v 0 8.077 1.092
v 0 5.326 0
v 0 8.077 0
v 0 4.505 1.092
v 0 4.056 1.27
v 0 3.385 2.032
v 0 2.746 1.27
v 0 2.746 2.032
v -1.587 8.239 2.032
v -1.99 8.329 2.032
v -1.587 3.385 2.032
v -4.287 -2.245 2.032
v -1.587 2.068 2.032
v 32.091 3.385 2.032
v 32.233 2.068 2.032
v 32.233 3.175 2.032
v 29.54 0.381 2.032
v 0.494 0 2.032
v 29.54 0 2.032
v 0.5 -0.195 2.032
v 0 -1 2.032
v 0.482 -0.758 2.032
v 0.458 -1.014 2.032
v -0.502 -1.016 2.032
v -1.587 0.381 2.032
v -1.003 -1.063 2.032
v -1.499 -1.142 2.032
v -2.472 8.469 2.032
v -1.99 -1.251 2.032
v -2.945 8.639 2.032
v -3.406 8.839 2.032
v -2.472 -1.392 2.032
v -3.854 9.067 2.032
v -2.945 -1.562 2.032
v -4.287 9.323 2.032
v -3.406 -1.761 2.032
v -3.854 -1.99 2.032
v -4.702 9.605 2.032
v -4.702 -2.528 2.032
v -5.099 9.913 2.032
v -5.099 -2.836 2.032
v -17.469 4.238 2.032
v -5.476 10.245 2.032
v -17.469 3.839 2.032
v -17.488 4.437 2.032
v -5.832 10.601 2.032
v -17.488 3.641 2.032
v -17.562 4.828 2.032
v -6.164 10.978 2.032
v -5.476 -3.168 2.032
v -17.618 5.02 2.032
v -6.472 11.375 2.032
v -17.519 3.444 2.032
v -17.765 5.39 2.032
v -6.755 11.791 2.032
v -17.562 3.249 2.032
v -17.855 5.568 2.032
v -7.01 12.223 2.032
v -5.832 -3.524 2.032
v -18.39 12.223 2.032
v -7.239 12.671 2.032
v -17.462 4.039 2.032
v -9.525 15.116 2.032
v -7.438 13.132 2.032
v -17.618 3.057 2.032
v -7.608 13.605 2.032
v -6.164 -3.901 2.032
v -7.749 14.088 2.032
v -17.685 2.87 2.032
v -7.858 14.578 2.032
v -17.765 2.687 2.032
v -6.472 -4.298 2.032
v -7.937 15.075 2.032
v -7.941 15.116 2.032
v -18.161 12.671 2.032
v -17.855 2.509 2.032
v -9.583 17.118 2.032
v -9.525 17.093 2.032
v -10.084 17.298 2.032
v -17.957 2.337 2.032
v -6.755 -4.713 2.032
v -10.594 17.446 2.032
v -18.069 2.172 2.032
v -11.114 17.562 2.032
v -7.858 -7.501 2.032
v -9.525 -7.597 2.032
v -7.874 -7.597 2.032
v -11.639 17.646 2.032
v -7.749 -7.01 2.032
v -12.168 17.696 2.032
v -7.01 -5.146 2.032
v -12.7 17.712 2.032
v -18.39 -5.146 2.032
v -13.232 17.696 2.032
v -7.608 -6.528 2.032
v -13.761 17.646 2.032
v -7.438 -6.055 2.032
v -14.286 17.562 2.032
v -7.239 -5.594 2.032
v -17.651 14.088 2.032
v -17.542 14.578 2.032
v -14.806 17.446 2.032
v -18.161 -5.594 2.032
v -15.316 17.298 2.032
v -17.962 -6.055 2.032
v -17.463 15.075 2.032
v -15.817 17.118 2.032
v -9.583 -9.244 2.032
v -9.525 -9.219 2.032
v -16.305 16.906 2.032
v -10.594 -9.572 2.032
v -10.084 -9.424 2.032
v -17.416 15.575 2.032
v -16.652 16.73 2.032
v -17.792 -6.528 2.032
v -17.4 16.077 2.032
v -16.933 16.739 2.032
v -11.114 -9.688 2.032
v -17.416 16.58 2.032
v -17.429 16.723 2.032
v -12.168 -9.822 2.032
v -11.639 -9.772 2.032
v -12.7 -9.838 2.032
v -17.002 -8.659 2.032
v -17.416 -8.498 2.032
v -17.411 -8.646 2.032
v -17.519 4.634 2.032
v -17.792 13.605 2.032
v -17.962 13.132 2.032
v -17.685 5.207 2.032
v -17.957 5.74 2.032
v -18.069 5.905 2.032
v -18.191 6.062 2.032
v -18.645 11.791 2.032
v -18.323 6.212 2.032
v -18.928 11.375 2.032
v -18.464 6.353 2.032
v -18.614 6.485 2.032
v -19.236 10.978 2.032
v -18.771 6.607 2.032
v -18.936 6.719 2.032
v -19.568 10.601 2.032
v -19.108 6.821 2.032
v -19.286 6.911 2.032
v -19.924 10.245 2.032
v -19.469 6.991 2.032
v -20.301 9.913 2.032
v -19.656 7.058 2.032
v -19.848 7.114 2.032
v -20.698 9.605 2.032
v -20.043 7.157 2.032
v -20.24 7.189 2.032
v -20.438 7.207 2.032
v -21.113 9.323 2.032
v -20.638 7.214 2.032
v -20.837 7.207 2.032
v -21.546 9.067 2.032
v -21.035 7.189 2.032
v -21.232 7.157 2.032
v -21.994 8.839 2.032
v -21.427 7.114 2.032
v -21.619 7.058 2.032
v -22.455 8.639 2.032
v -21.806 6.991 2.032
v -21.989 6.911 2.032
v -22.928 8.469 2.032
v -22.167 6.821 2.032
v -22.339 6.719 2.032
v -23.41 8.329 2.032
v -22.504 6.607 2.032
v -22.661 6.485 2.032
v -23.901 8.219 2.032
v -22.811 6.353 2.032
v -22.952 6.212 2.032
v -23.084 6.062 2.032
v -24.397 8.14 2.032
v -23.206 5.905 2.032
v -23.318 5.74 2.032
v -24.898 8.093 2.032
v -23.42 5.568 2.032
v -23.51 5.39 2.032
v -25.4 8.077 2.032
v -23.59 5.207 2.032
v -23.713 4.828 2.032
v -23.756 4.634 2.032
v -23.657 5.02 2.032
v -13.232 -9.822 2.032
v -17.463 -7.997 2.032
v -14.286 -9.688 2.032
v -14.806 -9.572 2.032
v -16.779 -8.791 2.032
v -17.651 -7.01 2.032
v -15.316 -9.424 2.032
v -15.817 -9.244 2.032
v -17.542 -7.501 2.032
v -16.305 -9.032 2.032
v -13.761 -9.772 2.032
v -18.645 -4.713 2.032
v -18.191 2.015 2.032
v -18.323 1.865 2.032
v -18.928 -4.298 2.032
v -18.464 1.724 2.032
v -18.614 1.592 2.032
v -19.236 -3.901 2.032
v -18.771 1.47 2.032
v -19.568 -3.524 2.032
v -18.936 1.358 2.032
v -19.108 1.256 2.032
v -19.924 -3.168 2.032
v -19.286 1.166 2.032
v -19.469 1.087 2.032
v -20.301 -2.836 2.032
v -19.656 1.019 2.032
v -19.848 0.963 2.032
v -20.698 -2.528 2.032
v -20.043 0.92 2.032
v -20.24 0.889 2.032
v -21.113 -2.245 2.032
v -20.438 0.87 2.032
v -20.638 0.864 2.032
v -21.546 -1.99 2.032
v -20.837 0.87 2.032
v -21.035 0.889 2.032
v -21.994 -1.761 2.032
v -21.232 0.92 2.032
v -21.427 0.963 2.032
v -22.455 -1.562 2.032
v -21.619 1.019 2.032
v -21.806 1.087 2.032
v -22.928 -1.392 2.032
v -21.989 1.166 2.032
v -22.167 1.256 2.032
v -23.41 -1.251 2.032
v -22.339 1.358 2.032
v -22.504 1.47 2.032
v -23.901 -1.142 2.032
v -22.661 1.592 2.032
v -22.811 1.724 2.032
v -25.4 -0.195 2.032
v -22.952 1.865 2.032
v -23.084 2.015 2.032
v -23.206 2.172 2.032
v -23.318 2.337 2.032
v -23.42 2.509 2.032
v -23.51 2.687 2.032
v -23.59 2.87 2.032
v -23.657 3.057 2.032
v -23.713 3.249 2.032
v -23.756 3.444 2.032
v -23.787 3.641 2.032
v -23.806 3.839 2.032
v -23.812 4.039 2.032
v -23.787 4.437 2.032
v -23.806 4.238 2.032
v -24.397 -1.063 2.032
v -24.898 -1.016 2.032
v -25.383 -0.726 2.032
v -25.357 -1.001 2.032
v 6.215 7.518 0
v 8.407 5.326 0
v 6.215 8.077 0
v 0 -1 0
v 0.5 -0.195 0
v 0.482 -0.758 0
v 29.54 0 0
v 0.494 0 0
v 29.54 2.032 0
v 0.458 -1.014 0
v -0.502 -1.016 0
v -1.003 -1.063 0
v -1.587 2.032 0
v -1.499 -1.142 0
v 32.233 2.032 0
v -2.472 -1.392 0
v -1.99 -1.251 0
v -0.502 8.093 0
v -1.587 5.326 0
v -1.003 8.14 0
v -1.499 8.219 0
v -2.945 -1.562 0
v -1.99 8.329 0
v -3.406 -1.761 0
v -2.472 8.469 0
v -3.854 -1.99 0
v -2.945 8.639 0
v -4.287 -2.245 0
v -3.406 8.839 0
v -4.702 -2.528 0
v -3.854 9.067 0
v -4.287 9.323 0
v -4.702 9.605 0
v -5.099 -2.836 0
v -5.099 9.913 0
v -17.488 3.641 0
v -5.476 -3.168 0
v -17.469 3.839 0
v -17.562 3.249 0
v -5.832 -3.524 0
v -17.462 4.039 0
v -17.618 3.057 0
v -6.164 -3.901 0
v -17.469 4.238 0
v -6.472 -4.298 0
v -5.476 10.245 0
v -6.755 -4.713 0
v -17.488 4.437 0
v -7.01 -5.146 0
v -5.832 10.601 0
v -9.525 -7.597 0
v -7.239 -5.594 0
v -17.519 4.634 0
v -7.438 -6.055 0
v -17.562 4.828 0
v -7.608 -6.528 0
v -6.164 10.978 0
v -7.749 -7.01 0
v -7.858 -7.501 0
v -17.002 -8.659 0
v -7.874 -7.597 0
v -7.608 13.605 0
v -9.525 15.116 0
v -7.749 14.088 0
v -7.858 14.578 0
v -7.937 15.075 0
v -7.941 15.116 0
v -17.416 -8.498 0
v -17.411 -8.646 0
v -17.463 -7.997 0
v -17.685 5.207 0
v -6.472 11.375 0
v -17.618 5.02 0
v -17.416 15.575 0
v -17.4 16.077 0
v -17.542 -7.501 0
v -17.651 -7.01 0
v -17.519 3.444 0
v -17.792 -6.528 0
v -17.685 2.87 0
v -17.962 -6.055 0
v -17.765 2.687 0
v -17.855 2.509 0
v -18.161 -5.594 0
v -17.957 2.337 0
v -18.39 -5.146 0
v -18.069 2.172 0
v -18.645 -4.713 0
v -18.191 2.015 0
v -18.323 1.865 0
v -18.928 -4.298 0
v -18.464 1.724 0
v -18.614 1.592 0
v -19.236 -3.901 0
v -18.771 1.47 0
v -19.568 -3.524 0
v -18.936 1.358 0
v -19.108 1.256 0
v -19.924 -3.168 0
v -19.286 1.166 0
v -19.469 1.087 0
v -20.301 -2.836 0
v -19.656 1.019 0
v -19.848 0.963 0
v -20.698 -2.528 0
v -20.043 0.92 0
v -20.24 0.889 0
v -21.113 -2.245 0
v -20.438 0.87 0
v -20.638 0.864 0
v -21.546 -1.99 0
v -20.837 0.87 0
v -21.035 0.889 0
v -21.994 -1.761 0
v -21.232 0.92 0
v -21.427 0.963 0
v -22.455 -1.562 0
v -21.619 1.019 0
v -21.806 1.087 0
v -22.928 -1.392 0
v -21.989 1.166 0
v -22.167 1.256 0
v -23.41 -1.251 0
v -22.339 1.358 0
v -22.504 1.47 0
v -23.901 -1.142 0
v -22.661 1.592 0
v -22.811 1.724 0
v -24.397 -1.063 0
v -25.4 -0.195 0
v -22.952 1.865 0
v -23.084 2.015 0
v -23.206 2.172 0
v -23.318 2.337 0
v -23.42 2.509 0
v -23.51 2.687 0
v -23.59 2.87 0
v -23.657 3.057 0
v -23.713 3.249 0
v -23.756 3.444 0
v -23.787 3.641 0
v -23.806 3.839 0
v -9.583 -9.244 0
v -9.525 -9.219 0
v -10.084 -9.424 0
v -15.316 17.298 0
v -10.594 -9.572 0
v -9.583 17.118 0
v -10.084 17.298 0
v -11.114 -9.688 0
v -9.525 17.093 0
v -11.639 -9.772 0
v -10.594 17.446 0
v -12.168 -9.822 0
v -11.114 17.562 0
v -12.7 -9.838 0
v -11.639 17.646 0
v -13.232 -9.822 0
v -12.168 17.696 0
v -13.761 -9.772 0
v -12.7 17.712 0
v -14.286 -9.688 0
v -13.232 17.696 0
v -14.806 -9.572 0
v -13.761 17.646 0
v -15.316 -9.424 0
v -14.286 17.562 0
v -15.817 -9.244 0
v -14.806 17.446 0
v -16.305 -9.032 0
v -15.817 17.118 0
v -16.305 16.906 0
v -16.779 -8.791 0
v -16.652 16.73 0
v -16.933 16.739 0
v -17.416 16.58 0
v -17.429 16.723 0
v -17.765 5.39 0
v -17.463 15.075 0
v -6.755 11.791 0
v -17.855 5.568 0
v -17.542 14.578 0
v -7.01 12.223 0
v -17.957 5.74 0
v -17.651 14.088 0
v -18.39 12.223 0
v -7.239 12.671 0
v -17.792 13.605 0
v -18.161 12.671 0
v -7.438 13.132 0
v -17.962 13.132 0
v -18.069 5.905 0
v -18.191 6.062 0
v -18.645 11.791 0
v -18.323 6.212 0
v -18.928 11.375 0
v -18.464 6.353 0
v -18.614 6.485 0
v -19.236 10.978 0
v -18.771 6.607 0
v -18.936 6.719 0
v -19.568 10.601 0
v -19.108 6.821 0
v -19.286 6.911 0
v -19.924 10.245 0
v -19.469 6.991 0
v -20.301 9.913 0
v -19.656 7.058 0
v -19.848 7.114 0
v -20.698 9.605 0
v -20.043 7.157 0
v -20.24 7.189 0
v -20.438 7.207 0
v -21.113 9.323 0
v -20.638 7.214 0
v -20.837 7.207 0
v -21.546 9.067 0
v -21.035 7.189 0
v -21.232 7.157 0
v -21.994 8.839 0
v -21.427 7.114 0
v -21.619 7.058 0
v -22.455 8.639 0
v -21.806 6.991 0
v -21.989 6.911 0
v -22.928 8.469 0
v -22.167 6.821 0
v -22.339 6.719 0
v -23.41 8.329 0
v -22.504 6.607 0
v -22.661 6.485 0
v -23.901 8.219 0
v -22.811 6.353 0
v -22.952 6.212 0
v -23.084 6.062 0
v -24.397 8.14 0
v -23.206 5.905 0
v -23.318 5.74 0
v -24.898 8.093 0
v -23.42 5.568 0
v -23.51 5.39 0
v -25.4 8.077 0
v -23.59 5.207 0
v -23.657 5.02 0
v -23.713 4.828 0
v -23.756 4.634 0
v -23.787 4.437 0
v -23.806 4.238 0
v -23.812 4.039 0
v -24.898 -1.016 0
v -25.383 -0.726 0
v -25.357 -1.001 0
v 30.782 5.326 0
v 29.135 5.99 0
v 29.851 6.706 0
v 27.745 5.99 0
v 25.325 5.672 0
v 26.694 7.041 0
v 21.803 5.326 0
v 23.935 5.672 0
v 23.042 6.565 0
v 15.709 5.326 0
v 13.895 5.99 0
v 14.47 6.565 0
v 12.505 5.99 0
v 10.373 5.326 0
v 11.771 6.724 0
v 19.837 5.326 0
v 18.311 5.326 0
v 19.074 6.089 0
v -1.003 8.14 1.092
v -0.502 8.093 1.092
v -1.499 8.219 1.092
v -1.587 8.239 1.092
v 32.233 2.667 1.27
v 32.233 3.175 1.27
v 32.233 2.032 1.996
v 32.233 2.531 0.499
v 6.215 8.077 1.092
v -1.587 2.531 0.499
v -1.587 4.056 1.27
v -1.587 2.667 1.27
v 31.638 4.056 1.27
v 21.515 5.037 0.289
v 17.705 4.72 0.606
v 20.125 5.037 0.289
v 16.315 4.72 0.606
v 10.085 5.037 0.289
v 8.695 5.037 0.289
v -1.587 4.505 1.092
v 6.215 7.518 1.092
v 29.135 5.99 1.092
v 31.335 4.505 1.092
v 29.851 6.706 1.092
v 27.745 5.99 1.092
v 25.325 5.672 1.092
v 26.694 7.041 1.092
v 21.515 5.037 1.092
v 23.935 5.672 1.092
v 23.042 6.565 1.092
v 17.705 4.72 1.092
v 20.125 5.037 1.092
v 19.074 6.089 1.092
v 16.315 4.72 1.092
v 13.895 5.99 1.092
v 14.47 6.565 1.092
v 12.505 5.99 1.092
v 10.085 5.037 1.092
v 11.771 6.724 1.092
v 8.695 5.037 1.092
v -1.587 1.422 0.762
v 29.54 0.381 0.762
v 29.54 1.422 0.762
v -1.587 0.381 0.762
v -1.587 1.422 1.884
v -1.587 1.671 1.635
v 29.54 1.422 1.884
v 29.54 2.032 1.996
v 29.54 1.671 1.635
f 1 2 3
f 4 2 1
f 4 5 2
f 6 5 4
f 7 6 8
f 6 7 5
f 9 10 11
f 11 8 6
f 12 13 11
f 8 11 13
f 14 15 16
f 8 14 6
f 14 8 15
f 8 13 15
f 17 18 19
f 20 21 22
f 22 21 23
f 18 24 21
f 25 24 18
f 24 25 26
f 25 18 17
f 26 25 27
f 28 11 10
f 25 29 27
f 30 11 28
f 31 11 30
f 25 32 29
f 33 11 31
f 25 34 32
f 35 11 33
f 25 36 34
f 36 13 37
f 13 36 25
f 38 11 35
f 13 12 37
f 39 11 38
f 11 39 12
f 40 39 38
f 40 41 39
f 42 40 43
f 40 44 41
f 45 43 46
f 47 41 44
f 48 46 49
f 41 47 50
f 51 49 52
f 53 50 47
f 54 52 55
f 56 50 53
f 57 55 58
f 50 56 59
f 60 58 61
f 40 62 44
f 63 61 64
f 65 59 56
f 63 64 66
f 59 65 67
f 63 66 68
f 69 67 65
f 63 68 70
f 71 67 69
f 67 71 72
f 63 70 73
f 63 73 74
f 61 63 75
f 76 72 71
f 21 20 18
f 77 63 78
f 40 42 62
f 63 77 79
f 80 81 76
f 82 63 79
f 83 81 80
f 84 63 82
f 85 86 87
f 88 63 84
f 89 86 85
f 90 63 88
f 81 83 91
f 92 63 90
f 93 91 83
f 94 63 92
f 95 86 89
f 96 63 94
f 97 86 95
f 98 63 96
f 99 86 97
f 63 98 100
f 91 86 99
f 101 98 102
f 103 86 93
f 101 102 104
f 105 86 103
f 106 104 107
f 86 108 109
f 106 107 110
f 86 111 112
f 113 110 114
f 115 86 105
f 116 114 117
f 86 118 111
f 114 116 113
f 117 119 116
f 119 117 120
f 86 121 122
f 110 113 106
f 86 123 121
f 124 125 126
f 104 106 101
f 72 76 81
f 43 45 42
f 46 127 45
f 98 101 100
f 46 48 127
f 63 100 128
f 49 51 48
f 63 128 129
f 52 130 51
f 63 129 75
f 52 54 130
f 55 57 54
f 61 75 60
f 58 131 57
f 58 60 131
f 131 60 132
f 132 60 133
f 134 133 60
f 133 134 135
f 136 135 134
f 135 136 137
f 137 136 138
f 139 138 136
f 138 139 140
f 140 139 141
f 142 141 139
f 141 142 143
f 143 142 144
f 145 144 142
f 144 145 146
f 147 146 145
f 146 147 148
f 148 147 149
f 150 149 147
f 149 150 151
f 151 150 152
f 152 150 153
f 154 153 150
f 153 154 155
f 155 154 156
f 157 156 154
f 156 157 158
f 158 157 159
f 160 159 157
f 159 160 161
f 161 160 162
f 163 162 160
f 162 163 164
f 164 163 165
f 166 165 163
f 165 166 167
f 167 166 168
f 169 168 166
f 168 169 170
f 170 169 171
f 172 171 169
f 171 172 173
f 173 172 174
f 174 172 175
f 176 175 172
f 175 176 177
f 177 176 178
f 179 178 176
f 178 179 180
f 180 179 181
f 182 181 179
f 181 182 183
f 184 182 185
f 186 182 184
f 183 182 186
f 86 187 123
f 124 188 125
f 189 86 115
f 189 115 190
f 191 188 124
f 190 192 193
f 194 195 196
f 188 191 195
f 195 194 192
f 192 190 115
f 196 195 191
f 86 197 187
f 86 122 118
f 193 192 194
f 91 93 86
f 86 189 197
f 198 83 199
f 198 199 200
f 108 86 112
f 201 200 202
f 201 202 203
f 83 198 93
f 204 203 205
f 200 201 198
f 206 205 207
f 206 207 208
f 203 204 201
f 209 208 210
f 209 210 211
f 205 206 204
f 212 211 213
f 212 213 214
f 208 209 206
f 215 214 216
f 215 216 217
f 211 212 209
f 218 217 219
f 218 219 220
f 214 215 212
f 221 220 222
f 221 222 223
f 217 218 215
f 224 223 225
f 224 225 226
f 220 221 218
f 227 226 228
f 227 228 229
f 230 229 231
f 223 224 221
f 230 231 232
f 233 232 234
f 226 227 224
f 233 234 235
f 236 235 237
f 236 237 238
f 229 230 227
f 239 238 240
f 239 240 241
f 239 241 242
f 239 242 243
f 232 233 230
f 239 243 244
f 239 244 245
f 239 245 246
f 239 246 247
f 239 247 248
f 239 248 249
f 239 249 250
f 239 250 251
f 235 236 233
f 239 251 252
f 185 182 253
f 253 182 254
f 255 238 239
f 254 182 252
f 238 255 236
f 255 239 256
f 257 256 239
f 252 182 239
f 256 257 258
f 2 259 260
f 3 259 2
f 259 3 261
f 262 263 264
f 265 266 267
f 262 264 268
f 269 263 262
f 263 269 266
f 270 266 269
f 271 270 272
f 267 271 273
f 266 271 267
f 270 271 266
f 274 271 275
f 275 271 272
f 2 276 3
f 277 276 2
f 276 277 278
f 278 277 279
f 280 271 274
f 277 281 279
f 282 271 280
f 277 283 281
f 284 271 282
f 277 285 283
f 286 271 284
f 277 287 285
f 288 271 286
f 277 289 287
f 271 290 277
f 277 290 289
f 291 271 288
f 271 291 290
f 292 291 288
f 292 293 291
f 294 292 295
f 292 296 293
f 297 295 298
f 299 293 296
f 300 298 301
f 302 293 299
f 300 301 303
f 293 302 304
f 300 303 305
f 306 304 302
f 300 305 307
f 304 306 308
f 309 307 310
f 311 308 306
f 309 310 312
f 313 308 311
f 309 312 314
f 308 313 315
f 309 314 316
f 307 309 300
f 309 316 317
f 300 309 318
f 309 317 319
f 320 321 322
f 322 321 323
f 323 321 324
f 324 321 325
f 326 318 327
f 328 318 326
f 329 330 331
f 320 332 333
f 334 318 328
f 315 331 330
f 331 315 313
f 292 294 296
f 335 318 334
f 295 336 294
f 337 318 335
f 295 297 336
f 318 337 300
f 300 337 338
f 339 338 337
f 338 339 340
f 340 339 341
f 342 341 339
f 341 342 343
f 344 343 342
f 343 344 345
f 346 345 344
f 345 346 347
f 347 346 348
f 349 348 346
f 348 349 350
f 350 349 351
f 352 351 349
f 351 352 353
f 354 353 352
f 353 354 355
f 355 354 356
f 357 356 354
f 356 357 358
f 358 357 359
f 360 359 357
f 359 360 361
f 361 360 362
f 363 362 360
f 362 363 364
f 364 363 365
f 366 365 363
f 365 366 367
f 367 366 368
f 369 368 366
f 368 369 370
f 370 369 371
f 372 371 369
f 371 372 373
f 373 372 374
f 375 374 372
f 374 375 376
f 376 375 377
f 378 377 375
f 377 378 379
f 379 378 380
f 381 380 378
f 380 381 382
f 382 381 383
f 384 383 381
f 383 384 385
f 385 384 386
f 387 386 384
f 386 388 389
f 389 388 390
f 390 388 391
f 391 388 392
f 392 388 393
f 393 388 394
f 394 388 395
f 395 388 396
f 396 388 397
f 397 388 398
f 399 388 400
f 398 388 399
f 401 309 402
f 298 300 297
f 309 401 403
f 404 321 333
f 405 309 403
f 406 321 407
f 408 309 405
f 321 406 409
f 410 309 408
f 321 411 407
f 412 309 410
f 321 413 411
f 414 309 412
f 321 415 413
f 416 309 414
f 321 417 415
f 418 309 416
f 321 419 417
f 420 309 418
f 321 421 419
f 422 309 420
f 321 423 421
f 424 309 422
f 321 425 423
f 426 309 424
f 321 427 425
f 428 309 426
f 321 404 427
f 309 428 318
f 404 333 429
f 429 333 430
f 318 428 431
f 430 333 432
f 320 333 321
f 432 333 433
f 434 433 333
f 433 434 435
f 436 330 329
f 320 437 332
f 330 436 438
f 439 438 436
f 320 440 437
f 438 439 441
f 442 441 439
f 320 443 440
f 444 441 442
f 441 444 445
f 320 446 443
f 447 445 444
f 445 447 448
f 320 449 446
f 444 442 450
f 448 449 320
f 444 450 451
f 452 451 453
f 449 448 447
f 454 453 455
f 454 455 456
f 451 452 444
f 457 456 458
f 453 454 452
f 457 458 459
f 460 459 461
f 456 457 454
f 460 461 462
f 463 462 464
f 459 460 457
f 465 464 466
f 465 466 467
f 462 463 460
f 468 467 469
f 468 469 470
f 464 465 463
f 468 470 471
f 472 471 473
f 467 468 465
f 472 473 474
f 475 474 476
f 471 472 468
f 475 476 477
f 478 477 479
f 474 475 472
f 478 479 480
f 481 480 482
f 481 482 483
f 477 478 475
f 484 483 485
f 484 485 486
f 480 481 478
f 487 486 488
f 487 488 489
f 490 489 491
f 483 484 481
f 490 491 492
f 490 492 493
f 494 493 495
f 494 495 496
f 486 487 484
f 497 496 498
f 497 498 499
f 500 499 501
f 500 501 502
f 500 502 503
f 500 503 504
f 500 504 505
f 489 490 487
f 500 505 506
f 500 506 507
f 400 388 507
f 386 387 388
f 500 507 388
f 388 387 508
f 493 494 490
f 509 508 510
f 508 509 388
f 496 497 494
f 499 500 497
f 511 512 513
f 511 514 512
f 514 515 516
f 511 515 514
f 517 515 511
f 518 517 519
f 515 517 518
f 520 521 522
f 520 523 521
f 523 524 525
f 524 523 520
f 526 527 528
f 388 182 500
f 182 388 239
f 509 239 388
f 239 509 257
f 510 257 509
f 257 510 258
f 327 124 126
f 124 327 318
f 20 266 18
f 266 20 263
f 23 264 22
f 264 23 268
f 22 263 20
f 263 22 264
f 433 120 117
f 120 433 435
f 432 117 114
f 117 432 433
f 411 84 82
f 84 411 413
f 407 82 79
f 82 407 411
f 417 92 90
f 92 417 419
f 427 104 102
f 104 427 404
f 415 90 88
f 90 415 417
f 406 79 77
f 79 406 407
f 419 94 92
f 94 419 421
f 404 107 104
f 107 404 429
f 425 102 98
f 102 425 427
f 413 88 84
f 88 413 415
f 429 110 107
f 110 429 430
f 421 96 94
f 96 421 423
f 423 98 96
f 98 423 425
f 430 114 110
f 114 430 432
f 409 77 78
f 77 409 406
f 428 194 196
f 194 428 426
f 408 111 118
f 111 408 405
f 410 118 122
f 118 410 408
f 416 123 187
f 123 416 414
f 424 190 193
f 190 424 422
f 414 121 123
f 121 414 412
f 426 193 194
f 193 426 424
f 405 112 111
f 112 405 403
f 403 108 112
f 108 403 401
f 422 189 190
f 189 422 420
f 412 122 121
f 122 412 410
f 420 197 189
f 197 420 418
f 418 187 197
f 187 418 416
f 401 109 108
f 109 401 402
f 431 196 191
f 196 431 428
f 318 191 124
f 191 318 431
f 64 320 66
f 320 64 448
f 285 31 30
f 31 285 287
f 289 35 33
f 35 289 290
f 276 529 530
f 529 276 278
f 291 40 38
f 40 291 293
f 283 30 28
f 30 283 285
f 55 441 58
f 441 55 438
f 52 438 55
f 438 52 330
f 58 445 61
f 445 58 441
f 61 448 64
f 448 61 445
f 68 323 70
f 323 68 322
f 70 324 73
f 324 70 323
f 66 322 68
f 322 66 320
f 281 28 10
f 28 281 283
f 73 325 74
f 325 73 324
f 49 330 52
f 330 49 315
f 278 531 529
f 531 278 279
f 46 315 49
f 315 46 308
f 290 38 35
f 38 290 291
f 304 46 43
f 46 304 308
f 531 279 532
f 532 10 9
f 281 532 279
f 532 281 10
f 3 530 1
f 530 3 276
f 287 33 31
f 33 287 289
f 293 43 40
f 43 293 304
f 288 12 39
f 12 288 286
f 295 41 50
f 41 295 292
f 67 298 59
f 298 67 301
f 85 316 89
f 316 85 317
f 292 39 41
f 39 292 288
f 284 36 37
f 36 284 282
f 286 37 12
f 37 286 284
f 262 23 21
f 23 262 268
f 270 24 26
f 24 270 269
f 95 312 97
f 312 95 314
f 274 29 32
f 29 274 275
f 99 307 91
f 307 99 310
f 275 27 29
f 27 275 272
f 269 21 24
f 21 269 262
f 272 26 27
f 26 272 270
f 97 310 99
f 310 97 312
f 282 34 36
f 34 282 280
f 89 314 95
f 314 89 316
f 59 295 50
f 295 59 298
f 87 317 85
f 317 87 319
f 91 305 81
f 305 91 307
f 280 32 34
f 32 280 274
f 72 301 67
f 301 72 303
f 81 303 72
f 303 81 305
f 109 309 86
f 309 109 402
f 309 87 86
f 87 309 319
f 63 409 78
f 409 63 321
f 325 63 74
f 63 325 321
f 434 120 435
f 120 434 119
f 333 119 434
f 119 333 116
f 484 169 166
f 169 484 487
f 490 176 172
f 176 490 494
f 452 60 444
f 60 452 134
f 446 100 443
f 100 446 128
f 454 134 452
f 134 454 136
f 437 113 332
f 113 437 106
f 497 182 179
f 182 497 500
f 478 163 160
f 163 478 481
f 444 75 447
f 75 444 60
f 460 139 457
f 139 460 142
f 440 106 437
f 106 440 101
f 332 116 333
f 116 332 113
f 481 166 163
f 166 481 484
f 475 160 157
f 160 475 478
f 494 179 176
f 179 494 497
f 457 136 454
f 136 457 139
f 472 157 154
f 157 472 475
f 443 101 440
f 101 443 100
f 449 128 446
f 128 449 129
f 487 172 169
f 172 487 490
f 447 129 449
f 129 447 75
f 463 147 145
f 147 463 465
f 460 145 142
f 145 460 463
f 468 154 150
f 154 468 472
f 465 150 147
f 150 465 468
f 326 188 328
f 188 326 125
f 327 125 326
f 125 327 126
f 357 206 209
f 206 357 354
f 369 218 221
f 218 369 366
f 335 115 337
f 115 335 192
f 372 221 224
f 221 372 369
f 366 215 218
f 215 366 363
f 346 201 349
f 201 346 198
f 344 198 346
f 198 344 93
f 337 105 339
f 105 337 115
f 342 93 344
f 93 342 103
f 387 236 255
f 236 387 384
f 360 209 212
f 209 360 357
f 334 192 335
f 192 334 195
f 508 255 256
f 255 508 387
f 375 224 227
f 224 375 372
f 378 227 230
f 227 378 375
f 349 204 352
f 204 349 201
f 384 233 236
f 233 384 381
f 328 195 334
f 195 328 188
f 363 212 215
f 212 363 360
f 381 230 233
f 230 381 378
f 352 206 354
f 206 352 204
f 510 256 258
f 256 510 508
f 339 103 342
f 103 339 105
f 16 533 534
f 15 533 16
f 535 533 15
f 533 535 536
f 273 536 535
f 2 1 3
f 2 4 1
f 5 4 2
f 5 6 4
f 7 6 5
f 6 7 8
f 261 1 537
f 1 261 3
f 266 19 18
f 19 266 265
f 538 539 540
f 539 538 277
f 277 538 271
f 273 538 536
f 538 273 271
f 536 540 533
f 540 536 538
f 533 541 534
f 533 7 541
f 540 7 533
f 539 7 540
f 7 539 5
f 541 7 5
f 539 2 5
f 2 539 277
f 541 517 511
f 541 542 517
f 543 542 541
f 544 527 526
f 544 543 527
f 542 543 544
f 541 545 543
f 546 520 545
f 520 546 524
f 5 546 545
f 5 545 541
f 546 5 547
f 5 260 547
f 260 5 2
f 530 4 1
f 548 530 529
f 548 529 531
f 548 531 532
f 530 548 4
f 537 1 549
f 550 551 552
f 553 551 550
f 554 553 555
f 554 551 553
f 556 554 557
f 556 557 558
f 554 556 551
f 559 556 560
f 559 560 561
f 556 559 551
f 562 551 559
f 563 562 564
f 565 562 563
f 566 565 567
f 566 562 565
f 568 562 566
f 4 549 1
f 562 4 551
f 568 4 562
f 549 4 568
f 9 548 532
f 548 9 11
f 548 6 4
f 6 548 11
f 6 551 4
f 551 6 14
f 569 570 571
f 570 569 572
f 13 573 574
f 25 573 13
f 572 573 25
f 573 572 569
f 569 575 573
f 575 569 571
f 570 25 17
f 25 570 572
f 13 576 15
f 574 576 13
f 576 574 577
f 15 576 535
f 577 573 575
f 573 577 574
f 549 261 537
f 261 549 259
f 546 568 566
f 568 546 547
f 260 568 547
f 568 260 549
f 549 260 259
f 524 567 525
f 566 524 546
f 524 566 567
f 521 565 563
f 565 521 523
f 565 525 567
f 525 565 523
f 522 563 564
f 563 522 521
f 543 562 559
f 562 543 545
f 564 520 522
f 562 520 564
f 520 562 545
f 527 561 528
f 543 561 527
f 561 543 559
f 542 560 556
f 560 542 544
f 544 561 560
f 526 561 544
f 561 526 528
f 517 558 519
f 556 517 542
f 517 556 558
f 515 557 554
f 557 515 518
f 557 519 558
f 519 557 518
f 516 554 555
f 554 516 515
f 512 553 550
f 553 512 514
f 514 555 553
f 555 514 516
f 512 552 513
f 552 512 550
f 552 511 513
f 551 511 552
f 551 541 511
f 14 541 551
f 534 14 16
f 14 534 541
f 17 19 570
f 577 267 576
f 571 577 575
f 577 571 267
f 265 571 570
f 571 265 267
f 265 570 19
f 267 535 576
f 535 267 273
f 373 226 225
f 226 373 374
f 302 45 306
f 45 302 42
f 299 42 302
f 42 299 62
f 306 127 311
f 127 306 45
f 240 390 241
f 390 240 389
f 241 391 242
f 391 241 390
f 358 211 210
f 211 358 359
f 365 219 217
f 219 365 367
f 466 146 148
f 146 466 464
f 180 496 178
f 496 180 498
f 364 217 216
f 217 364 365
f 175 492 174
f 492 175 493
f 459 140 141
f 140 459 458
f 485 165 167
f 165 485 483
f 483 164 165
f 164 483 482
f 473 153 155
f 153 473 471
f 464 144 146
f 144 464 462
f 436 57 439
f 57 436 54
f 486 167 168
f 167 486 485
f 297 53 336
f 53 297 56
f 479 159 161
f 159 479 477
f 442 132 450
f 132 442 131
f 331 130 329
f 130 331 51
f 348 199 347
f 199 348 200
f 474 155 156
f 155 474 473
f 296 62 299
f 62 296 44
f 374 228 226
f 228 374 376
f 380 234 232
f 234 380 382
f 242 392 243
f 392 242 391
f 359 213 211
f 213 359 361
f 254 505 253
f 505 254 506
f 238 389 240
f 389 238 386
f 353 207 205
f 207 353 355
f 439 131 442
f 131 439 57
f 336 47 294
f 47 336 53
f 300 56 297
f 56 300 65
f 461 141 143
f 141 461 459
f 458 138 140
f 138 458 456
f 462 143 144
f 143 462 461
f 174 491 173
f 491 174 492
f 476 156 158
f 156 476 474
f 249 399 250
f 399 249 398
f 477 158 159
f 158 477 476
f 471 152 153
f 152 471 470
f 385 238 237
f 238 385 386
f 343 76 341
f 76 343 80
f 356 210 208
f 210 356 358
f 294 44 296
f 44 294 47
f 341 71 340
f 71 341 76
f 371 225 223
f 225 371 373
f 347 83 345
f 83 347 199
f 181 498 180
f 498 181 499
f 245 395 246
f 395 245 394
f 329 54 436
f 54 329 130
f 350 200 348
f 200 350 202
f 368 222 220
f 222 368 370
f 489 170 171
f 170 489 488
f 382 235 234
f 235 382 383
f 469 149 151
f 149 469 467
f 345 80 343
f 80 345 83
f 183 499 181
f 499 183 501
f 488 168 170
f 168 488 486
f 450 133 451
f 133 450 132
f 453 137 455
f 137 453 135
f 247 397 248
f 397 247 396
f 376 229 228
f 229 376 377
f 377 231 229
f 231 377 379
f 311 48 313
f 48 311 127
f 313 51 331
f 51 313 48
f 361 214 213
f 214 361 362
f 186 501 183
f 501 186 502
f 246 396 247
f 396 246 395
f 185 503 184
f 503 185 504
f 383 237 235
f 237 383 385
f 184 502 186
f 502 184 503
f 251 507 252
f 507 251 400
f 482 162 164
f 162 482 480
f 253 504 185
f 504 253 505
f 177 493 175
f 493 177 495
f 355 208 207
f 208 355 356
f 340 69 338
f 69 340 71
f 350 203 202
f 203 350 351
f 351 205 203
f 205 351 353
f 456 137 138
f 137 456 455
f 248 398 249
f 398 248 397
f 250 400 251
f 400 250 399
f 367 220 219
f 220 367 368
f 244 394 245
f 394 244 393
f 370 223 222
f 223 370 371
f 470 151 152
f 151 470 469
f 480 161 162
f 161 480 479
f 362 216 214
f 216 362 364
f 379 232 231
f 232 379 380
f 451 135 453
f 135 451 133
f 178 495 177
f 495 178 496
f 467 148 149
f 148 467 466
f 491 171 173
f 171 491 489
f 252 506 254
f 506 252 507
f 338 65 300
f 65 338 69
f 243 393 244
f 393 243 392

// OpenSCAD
//
// Generate a duplicate of a BEST G key by editing the last line of the file
// and entering in the key code of the lock.  If you don't know the key code,
// you can measure the key and compare the numbers at:
// http://web.archive.org/web/20050217020917fw_/http://dlaco.com/spacing/tips.htm
//
// This work is licensed under a Creative Commons Attribution 3.0 Unported License.

// Since the keys and locks I have were all designed in imperial units, the
// constants in this file will be defined in inches.  The mm function
// allows us to retain the proper size for exporting a metric STL.
function mm(i) = i*25.4;
$fn=100;

module rounded(size, r) {
	 
    union() {
        translate([0, r, 0]) cube([size[0], size[1]-2*r, size[2]]);
        translate([r, r, 0]) cylinder(h=size[2], r=r);
        translate([size[0]-r, r, 0]) cylinder(h=size[2], r=(r+.5));
        translate([r, size[1]-r, 0]) cylinder(h=size[2], r=(r));
        translate([size[0]-r, size[1]-r, 0]) cylinder(h=size[2], r=r);
		translate([(mm(1))/2, mm(.205) + ((mm(1))/2), 0]) cylinder(h= size[2], r=r);
		translate([(mm(1))/2, mm(.287), 0]) cylinder(h= size[2], r=r);
	  }
}

module bit() {
    w = mm(1/4);
    difference() {
        translate([-w/2, 0, 0]) cube([w, mm(1), w]);
        translate([-mm(7/256), 0, 0]) rotate([0, 0, 135]) cube([w, w, w]);
         translate([mm(7/256), 0, 0]) rotate([0, 0, -45]) cube([w, w, w]);
    }
}

// BEST G key.  The measurements are mostly guesses based on reverse
// engineering some keys I have and some publicly available information.
module best_g(bits) {
    // You may need to adjust these to fit your specific printer settings
    thickness = mm(0.080);
    length = mm(1.269);
    width = mm(.318);
    
    shoulder = mm(0.2);
    pin_spacing = mm(.15);
    depth_inc = mm(.0125);
    
    // A fudge factor.  Printing with your average RepRap, the bottom layer is
    // going to be squeezed larger than you want. You can make the pins
    // go slighly deeper by a fudge amount to make up for it if you aren't
    // adjusting for it elsewhere like Skeinforge or in your firmware.
    fudge = 0.5;
    
    // Handle size
    h_l = mm(1);
    h_w = mm(1);
    h_d = mm(1/16);
    difference() {
        // blade and key handle
        union() {
            translate([-h_l, -h_w/2 + width/2, 0])  difference() {
                rounded([h_l, h_w, thickness], mm(1/3));
                // Round out edge of bow to blade            
                translate([h_l, h_w/2 + width/2 + 8, 0]) cylinder(h=thickness, r=8);
                translate([h_l, h_w/2 - width/2 - 9 , 0]) cylinder(h=thickness, r=8);
				translate([(5*h_l)/8, -3, 0])  cube([2*thickness, 2*thickness, thickness]);
				translate([(5*h_l)/8, 3 + width + ( h_l/2), 0])  cube([2*thickness, 2*thickness, thickness]);
                translate([0 , h_w/2 + width/2 + 8, 0]) cylinder(h=thickness, r=8);
                translate([0, h_w/2 - width/2 - 9 , 0]) cylinder(h=thickness, r=8);
		       }

            // cut a little off the tip to avoid going too long
            cube([length, width, thickness]);
        }
        
        // chamfer the tip
        translate([length, mm(1/8), 0]) {
            rotate([0, 0, 34]) cube([10, 10, thickness]);

        }
        translate([length - mm(.106), 0, 0]) {
            cube([mm(.106), mm(.08), thickness]);       
        }

        // put in a hole for keychain use
        translate([-h_l + mm(3/16), width/2, 0]) cylinder(h=thickness, r=mm(1/8));
        
        // cut the channels in the key.  designed more for printability than accuracy
        union() {
            translate([-h_d, mm(.105), mm(.025)]) rotate([225, 0, 0]) cube([length + h_d, width, width]);
            translate([-h_d, mm(.105), mm(.05)]) rotate([260, 0, 0]) cube([length + h_d, thickness/2, mm(1/32)]);
            translate([-h_d, mm(.105), 0]) cube([length + h_d, mm(7/128), mm(.05)]);
            translate([-h_d, mm(.105) + mm(7/128), mm(.05)]) rotate([225, 0, 0]) cube([length + h_d, mm(3/64), thickness]);
        }
        
        translate([-h_d, width - mm(9/64), mm(.043)]) {
            cube([length + h_d, width - (width - mm(10/64)), thickness]);
            rotate([50, 0, 0]) cube([length + h_d, width, thickness]);
        }
        
        union() {
            translate([-h_d, mm(0.015), mm(.03)]) cube([length + h_d, mm(.041), thickness]);
            translate([-h_d, mm(0.015) + mm(13/256), thickness - mm(1/64)]) rotate([45, 0, 0]) cube([length + h_d, mm(1/16), mm(1/16)]);
        }
        
        // Do the actual bitting
        for (b = [0:6]) {
			if (bits[b] == 0)
			{}
			else
			{
				translate([shoulder + fudge + b*pin_spacing, width - (bits[b])*depth_inc - fudge, 0]) bit();
			}
        }
    }
}

best_g([0, 8, 5, 9, 8, 6, 5]);
